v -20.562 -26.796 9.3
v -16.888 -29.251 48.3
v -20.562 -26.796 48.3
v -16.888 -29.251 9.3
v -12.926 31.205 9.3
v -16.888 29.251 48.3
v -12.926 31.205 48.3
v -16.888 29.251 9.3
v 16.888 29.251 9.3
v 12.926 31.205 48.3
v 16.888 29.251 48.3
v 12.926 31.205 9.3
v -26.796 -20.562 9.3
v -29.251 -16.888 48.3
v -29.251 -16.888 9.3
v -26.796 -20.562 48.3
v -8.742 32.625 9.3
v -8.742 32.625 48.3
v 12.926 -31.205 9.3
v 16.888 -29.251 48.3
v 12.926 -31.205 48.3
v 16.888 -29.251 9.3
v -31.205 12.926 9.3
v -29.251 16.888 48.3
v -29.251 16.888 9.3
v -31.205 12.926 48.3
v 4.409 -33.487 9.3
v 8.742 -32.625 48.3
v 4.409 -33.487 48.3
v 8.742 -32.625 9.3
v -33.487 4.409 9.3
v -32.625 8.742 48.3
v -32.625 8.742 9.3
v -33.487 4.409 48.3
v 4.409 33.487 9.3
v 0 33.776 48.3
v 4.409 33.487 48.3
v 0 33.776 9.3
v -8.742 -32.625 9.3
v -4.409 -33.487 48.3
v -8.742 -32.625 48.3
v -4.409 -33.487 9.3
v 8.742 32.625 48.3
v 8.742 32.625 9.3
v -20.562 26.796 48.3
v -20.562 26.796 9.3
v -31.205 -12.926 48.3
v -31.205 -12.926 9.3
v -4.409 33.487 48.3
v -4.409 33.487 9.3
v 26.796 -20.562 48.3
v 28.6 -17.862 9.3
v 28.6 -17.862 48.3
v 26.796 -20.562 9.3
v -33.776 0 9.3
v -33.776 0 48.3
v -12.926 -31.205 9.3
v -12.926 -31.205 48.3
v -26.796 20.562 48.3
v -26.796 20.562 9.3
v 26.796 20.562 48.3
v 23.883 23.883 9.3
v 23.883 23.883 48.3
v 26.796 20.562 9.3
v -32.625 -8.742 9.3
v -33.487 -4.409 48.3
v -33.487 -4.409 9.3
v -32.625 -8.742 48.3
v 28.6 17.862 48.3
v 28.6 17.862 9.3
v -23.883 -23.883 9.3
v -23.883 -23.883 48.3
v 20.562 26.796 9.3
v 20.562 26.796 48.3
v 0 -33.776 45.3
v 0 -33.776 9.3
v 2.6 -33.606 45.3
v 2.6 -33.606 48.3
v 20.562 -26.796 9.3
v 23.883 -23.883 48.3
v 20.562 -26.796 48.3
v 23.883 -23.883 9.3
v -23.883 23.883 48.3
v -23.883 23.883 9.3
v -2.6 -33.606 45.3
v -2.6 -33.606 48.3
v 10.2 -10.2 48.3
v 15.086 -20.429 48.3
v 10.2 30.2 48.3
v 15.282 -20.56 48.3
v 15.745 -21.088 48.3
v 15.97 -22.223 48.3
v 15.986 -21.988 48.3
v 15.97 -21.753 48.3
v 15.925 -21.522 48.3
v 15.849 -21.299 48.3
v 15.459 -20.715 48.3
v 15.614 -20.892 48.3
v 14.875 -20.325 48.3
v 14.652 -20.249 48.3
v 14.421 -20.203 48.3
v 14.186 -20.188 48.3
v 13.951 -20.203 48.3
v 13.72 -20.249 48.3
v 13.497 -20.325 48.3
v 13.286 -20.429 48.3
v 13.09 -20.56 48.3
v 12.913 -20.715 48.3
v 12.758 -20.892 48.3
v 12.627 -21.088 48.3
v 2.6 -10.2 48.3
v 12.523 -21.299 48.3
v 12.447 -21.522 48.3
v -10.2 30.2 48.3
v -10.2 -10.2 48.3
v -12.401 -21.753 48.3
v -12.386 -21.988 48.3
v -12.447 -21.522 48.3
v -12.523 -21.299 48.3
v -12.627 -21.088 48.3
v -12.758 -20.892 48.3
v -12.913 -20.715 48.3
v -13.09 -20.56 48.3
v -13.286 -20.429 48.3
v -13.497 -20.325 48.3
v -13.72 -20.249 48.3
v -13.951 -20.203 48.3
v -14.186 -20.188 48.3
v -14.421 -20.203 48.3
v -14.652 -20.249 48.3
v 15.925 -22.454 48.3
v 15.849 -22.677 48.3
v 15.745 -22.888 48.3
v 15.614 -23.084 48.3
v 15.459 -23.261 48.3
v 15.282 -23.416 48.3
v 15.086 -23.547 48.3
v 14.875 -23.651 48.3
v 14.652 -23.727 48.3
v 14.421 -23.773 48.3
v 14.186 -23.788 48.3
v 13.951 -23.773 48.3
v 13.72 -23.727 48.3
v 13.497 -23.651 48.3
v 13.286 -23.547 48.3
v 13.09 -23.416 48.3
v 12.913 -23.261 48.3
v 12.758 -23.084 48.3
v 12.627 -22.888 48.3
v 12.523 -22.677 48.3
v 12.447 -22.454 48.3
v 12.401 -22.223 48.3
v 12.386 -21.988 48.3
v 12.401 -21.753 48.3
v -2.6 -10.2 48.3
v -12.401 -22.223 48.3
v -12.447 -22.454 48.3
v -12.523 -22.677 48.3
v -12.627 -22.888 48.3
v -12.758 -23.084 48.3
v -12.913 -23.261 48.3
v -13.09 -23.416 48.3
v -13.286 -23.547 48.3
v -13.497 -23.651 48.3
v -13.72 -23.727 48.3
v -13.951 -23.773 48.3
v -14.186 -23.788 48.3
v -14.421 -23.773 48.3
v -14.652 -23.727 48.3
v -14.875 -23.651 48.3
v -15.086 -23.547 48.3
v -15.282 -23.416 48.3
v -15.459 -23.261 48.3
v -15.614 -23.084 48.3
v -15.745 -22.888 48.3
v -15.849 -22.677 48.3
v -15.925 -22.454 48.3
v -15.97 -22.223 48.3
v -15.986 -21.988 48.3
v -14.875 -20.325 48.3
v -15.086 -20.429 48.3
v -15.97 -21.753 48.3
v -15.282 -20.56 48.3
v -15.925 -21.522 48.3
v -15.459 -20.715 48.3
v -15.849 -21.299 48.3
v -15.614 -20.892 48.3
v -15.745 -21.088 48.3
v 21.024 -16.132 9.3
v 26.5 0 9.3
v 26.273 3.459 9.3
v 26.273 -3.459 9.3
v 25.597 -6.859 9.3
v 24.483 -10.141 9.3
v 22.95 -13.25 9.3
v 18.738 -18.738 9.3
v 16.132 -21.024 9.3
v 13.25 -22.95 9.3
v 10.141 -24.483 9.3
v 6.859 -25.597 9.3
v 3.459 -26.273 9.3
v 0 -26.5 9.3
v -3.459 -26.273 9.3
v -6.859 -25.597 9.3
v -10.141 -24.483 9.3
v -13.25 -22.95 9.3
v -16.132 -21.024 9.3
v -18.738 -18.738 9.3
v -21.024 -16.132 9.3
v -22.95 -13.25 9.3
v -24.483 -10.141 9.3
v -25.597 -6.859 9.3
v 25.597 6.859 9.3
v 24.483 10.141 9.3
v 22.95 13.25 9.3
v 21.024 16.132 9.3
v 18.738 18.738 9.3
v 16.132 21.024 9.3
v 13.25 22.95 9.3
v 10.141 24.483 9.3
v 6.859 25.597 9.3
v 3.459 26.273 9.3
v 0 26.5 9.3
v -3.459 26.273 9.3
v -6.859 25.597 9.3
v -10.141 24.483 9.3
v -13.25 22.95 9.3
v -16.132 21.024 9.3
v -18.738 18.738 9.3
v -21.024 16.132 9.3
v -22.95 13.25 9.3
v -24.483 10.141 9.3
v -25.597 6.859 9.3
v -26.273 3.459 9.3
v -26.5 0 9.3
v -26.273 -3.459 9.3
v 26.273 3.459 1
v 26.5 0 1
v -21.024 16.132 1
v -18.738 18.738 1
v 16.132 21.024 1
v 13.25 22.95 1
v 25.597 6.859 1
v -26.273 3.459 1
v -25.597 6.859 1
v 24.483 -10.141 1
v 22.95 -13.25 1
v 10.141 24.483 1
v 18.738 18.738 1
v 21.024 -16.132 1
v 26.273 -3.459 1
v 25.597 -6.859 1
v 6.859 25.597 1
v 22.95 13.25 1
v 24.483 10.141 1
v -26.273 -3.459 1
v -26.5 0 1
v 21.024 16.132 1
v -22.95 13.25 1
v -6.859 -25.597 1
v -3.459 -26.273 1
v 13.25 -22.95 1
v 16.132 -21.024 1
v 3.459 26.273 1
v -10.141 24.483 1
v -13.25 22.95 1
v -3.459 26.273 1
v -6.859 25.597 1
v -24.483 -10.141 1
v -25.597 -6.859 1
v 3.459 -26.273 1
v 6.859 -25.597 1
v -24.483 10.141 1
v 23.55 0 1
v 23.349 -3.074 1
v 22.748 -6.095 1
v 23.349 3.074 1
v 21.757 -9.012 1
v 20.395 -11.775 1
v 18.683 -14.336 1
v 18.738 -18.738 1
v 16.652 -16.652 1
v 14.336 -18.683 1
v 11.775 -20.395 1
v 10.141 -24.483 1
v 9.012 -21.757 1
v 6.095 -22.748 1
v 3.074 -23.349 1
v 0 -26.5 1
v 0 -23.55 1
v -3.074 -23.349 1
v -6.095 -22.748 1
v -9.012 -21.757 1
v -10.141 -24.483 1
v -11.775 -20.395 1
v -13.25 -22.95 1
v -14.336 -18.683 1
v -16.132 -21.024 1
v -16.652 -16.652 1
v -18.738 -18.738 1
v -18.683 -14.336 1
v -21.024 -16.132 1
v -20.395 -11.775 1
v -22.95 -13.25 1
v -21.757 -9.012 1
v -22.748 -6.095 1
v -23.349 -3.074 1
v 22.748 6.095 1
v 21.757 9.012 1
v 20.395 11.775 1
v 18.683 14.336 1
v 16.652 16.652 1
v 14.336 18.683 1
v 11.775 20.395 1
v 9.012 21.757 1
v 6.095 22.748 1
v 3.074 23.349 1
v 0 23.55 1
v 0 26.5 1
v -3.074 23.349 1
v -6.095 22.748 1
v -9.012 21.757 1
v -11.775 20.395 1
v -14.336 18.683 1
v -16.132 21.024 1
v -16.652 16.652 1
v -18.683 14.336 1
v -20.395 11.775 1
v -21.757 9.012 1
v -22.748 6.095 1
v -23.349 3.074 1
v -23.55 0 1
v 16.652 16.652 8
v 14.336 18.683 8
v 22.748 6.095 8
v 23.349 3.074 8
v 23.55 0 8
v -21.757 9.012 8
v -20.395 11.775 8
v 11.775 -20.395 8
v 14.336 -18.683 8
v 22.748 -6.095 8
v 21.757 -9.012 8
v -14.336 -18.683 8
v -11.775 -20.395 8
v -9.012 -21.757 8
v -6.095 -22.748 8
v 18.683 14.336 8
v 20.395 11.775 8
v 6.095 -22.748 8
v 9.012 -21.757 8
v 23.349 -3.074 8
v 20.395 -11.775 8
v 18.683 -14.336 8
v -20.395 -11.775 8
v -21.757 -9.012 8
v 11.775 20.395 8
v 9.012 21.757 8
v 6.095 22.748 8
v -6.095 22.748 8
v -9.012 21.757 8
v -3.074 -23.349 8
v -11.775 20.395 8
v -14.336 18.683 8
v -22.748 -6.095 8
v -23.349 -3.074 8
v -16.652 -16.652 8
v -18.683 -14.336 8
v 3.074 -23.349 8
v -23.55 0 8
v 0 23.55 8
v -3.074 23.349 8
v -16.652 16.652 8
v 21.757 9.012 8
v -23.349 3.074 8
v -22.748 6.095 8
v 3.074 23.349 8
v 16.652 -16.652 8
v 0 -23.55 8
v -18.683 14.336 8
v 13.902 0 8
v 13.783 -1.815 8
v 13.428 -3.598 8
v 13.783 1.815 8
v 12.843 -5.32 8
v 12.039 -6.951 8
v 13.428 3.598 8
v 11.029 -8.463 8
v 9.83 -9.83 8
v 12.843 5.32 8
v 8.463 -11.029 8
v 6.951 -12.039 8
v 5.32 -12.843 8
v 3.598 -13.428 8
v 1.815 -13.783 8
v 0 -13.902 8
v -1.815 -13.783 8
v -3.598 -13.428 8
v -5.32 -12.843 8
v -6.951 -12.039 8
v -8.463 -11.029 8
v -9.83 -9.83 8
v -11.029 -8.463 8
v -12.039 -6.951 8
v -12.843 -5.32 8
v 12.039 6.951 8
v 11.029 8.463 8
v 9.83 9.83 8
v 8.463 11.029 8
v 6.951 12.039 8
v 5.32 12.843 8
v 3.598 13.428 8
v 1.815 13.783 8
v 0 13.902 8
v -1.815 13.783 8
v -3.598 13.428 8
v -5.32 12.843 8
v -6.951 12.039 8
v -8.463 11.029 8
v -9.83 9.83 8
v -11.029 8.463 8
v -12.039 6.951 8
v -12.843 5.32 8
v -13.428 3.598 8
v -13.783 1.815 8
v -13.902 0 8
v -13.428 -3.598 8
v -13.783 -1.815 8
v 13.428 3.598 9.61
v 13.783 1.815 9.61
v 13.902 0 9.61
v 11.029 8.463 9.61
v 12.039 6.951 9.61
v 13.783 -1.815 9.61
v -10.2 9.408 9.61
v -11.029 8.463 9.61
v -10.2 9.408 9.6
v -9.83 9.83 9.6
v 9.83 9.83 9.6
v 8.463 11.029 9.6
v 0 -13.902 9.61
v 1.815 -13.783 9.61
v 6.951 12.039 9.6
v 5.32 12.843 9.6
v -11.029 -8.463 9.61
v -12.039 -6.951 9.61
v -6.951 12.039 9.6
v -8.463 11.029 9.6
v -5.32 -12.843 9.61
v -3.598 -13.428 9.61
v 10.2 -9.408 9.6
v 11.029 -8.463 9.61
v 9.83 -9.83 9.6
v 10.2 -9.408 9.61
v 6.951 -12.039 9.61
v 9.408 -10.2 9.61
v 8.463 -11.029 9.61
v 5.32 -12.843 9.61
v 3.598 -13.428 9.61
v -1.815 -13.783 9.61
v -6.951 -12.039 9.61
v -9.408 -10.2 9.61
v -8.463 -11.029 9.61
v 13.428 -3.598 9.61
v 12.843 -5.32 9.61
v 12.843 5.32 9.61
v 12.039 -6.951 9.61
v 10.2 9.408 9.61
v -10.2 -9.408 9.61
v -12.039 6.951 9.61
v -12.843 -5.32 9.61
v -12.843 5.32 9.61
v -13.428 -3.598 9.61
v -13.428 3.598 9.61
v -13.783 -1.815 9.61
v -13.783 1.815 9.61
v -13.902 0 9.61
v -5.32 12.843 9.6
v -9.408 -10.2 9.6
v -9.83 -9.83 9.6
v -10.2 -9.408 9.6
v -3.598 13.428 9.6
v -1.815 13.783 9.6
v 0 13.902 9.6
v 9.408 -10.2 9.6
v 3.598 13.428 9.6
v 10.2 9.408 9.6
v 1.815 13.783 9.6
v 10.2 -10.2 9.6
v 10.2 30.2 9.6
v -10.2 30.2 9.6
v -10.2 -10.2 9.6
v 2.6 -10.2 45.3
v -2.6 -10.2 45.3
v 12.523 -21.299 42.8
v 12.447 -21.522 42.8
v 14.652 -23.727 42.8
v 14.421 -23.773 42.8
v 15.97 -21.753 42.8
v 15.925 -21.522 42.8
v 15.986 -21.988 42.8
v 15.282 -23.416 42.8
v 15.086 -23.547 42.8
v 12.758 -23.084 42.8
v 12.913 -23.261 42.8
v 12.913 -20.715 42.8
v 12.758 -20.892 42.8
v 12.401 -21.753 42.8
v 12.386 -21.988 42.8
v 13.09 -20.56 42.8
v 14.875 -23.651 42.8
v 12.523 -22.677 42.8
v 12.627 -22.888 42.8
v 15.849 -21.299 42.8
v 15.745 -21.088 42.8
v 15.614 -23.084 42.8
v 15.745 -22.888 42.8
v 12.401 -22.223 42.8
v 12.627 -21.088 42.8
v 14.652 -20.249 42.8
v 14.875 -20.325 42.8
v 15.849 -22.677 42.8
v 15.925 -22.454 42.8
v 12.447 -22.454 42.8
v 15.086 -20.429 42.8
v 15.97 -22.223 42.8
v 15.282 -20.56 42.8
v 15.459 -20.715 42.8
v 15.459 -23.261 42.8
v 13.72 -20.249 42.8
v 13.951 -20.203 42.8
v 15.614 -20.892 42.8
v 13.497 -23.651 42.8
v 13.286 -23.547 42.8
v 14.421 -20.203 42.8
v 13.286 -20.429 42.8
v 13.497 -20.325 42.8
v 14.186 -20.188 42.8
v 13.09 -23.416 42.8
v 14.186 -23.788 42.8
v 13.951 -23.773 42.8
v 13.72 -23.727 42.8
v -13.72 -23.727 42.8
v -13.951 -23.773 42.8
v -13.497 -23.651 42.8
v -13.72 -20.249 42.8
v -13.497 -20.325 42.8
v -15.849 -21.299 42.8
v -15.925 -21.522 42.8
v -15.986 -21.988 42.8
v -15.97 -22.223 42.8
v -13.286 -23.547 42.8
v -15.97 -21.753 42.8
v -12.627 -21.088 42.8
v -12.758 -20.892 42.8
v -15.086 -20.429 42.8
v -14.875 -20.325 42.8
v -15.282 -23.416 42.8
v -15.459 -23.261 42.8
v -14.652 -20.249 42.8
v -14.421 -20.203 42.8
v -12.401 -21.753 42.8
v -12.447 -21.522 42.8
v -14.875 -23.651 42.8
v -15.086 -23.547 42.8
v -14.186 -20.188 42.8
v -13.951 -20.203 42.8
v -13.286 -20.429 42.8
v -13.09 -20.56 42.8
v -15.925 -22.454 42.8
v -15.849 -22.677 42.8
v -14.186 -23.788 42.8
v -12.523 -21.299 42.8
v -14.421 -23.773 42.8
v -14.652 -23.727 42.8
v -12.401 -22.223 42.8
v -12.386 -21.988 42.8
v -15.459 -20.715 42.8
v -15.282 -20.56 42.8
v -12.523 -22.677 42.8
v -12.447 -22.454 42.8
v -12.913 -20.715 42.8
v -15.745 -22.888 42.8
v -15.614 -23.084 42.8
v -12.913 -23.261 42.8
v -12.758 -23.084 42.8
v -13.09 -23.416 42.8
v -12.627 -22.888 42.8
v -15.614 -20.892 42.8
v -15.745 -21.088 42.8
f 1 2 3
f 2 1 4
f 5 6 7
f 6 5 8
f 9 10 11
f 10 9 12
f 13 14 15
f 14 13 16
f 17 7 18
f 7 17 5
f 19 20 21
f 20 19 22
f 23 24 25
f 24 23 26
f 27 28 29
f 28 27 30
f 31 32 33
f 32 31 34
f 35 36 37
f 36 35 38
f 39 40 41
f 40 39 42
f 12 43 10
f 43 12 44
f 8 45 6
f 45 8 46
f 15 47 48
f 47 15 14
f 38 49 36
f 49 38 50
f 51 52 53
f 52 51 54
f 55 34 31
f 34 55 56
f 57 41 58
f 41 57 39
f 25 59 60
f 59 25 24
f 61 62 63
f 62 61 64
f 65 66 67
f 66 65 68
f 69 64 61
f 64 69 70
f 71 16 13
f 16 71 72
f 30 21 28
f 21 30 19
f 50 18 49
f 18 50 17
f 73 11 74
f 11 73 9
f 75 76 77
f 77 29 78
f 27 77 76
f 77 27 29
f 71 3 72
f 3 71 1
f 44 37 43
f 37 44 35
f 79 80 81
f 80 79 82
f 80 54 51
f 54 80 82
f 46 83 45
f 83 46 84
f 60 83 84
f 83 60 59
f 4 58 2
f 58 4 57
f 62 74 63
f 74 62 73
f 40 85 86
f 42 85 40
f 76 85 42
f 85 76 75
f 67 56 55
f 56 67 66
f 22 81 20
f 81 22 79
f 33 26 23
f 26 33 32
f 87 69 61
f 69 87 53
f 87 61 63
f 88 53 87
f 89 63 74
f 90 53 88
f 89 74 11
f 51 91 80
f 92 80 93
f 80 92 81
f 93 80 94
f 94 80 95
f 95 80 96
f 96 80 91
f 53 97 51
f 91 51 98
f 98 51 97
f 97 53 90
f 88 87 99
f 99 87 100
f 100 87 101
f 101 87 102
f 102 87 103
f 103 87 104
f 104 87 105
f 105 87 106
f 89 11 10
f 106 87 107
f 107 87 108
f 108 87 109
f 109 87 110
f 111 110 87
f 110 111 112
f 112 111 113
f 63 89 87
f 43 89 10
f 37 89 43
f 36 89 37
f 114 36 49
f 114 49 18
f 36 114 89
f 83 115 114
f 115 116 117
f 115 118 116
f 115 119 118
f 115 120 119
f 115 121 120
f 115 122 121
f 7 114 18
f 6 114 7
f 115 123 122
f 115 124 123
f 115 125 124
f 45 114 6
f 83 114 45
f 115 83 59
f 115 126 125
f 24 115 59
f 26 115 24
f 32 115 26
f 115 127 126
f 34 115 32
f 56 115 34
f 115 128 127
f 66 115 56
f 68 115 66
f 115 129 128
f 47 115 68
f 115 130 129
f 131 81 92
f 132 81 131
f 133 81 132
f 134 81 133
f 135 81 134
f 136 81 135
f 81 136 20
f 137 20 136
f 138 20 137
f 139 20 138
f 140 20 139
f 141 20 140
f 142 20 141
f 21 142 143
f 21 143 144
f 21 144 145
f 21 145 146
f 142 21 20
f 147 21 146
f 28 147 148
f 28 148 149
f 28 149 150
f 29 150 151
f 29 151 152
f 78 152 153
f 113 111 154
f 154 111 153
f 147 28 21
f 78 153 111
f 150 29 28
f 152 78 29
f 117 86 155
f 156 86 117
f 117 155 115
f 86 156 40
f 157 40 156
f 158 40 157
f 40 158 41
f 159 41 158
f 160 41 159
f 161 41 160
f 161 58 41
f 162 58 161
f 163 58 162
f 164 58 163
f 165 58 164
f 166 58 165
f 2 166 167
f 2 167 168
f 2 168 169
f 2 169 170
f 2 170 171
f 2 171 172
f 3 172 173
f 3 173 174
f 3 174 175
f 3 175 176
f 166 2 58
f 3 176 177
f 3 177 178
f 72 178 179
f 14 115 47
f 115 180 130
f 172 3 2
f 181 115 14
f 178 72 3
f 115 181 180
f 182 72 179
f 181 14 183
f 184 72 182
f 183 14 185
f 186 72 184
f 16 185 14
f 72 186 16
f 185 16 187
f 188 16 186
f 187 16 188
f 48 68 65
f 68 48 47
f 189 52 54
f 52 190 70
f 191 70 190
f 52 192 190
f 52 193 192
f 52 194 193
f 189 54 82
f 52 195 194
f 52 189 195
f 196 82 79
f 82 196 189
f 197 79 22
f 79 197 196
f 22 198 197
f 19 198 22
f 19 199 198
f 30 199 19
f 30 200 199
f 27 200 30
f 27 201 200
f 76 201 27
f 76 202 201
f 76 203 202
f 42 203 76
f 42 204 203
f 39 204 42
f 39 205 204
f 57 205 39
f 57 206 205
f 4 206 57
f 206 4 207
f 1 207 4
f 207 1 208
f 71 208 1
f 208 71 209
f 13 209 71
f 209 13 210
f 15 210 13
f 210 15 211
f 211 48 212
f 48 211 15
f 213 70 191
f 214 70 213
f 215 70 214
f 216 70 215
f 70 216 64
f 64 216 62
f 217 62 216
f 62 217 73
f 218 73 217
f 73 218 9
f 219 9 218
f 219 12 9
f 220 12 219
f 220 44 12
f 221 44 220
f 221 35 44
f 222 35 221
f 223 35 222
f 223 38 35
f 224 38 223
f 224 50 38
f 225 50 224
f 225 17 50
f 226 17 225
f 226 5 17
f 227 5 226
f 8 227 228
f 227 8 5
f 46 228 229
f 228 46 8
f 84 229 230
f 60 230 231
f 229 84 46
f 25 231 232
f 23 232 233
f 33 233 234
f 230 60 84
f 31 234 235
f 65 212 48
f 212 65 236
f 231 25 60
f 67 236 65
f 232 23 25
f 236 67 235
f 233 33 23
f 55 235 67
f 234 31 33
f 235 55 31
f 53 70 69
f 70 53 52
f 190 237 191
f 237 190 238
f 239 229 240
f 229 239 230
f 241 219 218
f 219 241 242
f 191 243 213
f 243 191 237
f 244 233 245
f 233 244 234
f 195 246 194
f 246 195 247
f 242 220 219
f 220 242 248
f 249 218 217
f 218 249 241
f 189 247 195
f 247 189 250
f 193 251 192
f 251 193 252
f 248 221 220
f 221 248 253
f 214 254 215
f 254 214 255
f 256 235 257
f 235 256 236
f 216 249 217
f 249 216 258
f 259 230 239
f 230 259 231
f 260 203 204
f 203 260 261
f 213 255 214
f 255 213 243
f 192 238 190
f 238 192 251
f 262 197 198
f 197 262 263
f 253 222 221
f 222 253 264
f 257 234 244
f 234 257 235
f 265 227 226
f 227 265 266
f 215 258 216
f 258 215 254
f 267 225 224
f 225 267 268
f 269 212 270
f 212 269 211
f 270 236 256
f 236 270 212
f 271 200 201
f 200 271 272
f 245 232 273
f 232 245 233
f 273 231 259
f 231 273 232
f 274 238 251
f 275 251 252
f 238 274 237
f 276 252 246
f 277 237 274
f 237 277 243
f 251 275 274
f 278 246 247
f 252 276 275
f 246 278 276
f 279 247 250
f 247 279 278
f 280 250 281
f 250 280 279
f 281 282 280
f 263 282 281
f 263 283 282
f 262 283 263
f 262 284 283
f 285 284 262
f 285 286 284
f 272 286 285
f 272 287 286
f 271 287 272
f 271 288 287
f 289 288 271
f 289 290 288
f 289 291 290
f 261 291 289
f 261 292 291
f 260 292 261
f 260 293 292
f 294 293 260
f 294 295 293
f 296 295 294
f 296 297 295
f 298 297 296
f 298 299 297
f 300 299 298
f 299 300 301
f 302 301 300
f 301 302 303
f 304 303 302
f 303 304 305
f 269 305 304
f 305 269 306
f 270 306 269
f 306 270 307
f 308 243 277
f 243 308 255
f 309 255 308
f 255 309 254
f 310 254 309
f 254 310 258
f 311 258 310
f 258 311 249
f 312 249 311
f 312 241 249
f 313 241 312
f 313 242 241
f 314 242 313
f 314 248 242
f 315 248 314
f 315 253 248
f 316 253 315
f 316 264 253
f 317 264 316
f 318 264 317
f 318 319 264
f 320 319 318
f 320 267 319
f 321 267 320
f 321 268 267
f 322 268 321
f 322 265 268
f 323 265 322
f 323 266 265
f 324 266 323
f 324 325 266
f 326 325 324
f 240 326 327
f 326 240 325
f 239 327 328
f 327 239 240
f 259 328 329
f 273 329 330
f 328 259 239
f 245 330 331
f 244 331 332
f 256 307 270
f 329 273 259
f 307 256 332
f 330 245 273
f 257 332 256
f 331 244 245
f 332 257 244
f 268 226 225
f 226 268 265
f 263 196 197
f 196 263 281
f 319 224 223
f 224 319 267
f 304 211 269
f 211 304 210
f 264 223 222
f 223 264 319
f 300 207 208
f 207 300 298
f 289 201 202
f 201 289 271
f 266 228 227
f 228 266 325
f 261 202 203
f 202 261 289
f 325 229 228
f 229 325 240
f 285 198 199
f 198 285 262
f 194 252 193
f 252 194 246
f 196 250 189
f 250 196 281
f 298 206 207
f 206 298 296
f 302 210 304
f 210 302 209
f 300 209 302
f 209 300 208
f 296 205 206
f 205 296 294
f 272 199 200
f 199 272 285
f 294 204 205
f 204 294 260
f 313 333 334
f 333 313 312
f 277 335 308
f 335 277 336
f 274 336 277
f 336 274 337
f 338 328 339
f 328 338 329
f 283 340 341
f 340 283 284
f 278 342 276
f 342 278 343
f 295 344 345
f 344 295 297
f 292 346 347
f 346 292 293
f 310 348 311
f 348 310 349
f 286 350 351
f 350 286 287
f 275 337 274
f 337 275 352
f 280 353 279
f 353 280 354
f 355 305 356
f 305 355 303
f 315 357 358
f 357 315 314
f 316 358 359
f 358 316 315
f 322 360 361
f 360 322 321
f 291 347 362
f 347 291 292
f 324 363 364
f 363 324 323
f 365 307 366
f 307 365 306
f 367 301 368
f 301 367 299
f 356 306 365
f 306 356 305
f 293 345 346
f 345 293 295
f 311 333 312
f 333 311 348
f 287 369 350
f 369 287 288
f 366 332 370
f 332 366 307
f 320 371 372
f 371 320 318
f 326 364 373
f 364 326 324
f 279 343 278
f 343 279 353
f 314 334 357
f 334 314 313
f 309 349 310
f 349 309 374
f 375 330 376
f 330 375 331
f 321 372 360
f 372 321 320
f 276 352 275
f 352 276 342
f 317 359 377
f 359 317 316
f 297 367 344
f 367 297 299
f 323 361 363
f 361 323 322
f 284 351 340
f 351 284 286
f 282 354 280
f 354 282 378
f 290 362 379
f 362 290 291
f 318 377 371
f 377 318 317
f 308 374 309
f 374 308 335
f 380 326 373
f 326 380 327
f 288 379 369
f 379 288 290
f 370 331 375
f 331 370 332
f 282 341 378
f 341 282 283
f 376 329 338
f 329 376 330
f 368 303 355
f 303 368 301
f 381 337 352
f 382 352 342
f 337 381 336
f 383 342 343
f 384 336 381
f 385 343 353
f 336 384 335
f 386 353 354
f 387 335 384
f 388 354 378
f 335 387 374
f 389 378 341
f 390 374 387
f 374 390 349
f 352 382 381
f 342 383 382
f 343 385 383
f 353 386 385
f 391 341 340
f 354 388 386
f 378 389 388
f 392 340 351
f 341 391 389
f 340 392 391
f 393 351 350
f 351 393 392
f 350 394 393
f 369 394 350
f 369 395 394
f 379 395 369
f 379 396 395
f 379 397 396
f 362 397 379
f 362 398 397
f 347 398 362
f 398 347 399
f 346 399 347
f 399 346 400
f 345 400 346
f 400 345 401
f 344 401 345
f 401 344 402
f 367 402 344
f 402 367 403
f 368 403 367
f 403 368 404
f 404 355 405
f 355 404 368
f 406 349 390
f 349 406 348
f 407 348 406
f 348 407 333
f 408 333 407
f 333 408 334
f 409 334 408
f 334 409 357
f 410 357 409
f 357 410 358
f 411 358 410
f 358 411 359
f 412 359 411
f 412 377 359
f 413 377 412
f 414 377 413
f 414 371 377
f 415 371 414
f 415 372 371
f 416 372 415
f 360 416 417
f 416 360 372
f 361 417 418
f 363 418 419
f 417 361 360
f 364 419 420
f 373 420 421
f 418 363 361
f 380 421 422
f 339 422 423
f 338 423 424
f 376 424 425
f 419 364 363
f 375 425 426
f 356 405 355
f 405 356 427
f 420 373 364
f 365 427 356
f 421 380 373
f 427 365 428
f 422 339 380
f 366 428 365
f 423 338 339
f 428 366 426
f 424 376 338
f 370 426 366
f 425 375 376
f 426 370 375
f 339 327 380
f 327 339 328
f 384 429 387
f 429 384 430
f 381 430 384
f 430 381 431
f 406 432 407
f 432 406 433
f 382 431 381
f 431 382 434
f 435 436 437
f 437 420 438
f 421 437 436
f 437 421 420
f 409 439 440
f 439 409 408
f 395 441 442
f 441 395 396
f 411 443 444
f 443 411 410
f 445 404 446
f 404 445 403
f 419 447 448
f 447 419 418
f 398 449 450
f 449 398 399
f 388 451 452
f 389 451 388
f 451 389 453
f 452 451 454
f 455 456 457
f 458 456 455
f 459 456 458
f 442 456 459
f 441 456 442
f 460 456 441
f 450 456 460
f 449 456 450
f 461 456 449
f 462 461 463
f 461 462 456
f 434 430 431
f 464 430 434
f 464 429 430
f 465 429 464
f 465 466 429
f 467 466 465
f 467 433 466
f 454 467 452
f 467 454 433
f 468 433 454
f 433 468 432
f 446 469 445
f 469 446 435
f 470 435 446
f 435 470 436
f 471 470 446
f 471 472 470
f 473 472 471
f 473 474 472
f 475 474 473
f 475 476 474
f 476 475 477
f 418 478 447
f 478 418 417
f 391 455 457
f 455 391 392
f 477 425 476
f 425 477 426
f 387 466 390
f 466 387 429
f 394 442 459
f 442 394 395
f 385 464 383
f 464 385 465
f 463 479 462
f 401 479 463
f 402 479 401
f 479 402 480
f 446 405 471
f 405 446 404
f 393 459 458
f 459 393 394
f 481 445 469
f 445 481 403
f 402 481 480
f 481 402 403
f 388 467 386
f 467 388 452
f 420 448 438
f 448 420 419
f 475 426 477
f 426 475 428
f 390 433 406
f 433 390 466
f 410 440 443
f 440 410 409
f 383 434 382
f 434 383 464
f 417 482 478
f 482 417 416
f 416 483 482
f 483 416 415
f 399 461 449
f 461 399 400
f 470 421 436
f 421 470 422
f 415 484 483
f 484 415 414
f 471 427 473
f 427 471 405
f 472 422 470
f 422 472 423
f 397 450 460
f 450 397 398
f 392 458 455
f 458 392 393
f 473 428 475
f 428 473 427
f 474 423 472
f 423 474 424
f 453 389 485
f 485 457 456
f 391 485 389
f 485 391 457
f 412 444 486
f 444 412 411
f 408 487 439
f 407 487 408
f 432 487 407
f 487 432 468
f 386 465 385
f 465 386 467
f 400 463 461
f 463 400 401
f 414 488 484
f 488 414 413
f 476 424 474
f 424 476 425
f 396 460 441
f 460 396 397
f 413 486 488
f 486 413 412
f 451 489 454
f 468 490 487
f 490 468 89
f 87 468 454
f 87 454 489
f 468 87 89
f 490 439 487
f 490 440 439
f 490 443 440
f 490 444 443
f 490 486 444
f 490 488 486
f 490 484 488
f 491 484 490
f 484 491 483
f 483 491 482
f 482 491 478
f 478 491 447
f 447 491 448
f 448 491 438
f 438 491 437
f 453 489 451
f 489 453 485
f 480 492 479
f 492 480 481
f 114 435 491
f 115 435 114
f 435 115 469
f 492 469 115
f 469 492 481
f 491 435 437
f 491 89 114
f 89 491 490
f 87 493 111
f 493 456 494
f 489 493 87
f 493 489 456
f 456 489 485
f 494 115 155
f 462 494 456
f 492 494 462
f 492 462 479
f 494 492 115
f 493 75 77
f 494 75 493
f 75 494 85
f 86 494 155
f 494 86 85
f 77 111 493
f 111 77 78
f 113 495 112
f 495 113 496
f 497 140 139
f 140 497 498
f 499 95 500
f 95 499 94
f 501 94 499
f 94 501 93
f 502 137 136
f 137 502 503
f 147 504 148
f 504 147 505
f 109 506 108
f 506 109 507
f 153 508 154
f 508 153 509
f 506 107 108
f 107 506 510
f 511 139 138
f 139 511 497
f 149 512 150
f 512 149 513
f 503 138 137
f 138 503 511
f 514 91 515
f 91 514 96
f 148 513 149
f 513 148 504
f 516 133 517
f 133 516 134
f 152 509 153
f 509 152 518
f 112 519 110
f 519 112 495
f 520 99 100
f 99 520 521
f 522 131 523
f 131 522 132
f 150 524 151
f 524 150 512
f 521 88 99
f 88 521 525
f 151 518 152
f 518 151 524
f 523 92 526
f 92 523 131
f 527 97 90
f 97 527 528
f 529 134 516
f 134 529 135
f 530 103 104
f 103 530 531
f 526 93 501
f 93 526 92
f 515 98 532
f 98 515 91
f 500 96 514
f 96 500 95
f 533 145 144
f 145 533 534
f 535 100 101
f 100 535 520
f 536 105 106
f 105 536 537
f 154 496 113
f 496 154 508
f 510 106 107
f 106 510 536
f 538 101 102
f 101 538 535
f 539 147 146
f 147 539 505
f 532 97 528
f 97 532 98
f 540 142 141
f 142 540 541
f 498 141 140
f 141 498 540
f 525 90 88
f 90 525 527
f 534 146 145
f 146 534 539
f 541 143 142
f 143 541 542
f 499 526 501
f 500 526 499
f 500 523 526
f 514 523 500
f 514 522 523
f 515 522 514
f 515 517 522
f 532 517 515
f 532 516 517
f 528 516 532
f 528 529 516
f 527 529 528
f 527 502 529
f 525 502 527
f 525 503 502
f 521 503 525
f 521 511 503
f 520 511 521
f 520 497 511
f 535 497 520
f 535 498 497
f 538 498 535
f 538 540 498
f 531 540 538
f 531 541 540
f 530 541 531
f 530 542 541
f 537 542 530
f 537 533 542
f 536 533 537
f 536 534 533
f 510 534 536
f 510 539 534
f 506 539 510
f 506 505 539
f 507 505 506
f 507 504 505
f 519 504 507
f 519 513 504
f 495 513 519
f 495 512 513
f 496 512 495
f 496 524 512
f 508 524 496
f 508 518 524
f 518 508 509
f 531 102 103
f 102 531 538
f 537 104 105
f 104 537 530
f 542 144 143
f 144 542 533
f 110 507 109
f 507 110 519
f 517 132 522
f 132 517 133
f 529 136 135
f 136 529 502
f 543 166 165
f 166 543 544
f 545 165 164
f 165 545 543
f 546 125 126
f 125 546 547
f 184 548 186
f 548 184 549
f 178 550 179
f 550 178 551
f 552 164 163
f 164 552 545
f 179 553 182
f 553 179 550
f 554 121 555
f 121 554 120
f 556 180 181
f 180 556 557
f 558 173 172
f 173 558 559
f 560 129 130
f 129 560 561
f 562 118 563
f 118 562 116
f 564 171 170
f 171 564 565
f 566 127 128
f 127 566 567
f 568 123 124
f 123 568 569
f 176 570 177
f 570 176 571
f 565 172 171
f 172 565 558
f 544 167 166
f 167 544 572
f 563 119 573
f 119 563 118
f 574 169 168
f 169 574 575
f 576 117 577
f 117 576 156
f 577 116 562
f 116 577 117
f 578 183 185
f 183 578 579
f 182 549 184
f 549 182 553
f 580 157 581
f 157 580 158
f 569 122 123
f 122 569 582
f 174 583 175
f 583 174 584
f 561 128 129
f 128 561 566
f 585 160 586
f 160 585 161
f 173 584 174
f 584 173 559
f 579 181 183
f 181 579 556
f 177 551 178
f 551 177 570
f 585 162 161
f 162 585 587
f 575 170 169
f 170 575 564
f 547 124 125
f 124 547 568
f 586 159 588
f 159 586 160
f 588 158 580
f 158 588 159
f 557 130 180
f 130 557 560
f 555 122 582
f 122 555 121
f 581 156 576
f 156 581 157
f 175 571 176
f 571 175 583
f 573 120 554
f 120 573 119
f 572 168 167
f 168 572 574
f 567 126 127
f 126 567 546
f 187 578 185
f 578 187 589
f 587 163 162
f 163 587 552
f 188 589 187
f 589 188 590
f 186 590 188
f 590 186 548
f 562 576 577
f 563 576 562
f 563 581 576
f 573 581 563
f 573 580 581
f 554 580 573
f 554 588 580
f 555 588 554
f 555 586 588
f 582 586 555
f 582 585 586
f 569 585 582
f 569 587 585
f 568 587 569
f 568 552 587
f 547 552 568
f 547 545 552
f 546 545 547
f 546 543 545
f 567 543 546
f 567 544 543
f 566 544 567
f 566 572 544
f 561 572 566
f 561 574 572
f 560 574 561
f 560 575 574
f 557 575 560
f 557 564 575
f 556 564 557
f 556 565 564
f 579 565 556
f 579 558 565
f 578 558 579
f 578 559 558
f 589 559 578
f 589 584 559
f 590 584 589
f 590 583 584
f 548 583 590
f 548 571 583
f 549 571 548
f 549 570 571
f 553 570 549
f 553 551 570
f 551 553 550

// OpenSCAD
// left cartridge_roll: press F6 (render) then File > Export > STL
include <../lib/g1_servo_arm.scad>
side = "left";
part = "cartridge_roll";
